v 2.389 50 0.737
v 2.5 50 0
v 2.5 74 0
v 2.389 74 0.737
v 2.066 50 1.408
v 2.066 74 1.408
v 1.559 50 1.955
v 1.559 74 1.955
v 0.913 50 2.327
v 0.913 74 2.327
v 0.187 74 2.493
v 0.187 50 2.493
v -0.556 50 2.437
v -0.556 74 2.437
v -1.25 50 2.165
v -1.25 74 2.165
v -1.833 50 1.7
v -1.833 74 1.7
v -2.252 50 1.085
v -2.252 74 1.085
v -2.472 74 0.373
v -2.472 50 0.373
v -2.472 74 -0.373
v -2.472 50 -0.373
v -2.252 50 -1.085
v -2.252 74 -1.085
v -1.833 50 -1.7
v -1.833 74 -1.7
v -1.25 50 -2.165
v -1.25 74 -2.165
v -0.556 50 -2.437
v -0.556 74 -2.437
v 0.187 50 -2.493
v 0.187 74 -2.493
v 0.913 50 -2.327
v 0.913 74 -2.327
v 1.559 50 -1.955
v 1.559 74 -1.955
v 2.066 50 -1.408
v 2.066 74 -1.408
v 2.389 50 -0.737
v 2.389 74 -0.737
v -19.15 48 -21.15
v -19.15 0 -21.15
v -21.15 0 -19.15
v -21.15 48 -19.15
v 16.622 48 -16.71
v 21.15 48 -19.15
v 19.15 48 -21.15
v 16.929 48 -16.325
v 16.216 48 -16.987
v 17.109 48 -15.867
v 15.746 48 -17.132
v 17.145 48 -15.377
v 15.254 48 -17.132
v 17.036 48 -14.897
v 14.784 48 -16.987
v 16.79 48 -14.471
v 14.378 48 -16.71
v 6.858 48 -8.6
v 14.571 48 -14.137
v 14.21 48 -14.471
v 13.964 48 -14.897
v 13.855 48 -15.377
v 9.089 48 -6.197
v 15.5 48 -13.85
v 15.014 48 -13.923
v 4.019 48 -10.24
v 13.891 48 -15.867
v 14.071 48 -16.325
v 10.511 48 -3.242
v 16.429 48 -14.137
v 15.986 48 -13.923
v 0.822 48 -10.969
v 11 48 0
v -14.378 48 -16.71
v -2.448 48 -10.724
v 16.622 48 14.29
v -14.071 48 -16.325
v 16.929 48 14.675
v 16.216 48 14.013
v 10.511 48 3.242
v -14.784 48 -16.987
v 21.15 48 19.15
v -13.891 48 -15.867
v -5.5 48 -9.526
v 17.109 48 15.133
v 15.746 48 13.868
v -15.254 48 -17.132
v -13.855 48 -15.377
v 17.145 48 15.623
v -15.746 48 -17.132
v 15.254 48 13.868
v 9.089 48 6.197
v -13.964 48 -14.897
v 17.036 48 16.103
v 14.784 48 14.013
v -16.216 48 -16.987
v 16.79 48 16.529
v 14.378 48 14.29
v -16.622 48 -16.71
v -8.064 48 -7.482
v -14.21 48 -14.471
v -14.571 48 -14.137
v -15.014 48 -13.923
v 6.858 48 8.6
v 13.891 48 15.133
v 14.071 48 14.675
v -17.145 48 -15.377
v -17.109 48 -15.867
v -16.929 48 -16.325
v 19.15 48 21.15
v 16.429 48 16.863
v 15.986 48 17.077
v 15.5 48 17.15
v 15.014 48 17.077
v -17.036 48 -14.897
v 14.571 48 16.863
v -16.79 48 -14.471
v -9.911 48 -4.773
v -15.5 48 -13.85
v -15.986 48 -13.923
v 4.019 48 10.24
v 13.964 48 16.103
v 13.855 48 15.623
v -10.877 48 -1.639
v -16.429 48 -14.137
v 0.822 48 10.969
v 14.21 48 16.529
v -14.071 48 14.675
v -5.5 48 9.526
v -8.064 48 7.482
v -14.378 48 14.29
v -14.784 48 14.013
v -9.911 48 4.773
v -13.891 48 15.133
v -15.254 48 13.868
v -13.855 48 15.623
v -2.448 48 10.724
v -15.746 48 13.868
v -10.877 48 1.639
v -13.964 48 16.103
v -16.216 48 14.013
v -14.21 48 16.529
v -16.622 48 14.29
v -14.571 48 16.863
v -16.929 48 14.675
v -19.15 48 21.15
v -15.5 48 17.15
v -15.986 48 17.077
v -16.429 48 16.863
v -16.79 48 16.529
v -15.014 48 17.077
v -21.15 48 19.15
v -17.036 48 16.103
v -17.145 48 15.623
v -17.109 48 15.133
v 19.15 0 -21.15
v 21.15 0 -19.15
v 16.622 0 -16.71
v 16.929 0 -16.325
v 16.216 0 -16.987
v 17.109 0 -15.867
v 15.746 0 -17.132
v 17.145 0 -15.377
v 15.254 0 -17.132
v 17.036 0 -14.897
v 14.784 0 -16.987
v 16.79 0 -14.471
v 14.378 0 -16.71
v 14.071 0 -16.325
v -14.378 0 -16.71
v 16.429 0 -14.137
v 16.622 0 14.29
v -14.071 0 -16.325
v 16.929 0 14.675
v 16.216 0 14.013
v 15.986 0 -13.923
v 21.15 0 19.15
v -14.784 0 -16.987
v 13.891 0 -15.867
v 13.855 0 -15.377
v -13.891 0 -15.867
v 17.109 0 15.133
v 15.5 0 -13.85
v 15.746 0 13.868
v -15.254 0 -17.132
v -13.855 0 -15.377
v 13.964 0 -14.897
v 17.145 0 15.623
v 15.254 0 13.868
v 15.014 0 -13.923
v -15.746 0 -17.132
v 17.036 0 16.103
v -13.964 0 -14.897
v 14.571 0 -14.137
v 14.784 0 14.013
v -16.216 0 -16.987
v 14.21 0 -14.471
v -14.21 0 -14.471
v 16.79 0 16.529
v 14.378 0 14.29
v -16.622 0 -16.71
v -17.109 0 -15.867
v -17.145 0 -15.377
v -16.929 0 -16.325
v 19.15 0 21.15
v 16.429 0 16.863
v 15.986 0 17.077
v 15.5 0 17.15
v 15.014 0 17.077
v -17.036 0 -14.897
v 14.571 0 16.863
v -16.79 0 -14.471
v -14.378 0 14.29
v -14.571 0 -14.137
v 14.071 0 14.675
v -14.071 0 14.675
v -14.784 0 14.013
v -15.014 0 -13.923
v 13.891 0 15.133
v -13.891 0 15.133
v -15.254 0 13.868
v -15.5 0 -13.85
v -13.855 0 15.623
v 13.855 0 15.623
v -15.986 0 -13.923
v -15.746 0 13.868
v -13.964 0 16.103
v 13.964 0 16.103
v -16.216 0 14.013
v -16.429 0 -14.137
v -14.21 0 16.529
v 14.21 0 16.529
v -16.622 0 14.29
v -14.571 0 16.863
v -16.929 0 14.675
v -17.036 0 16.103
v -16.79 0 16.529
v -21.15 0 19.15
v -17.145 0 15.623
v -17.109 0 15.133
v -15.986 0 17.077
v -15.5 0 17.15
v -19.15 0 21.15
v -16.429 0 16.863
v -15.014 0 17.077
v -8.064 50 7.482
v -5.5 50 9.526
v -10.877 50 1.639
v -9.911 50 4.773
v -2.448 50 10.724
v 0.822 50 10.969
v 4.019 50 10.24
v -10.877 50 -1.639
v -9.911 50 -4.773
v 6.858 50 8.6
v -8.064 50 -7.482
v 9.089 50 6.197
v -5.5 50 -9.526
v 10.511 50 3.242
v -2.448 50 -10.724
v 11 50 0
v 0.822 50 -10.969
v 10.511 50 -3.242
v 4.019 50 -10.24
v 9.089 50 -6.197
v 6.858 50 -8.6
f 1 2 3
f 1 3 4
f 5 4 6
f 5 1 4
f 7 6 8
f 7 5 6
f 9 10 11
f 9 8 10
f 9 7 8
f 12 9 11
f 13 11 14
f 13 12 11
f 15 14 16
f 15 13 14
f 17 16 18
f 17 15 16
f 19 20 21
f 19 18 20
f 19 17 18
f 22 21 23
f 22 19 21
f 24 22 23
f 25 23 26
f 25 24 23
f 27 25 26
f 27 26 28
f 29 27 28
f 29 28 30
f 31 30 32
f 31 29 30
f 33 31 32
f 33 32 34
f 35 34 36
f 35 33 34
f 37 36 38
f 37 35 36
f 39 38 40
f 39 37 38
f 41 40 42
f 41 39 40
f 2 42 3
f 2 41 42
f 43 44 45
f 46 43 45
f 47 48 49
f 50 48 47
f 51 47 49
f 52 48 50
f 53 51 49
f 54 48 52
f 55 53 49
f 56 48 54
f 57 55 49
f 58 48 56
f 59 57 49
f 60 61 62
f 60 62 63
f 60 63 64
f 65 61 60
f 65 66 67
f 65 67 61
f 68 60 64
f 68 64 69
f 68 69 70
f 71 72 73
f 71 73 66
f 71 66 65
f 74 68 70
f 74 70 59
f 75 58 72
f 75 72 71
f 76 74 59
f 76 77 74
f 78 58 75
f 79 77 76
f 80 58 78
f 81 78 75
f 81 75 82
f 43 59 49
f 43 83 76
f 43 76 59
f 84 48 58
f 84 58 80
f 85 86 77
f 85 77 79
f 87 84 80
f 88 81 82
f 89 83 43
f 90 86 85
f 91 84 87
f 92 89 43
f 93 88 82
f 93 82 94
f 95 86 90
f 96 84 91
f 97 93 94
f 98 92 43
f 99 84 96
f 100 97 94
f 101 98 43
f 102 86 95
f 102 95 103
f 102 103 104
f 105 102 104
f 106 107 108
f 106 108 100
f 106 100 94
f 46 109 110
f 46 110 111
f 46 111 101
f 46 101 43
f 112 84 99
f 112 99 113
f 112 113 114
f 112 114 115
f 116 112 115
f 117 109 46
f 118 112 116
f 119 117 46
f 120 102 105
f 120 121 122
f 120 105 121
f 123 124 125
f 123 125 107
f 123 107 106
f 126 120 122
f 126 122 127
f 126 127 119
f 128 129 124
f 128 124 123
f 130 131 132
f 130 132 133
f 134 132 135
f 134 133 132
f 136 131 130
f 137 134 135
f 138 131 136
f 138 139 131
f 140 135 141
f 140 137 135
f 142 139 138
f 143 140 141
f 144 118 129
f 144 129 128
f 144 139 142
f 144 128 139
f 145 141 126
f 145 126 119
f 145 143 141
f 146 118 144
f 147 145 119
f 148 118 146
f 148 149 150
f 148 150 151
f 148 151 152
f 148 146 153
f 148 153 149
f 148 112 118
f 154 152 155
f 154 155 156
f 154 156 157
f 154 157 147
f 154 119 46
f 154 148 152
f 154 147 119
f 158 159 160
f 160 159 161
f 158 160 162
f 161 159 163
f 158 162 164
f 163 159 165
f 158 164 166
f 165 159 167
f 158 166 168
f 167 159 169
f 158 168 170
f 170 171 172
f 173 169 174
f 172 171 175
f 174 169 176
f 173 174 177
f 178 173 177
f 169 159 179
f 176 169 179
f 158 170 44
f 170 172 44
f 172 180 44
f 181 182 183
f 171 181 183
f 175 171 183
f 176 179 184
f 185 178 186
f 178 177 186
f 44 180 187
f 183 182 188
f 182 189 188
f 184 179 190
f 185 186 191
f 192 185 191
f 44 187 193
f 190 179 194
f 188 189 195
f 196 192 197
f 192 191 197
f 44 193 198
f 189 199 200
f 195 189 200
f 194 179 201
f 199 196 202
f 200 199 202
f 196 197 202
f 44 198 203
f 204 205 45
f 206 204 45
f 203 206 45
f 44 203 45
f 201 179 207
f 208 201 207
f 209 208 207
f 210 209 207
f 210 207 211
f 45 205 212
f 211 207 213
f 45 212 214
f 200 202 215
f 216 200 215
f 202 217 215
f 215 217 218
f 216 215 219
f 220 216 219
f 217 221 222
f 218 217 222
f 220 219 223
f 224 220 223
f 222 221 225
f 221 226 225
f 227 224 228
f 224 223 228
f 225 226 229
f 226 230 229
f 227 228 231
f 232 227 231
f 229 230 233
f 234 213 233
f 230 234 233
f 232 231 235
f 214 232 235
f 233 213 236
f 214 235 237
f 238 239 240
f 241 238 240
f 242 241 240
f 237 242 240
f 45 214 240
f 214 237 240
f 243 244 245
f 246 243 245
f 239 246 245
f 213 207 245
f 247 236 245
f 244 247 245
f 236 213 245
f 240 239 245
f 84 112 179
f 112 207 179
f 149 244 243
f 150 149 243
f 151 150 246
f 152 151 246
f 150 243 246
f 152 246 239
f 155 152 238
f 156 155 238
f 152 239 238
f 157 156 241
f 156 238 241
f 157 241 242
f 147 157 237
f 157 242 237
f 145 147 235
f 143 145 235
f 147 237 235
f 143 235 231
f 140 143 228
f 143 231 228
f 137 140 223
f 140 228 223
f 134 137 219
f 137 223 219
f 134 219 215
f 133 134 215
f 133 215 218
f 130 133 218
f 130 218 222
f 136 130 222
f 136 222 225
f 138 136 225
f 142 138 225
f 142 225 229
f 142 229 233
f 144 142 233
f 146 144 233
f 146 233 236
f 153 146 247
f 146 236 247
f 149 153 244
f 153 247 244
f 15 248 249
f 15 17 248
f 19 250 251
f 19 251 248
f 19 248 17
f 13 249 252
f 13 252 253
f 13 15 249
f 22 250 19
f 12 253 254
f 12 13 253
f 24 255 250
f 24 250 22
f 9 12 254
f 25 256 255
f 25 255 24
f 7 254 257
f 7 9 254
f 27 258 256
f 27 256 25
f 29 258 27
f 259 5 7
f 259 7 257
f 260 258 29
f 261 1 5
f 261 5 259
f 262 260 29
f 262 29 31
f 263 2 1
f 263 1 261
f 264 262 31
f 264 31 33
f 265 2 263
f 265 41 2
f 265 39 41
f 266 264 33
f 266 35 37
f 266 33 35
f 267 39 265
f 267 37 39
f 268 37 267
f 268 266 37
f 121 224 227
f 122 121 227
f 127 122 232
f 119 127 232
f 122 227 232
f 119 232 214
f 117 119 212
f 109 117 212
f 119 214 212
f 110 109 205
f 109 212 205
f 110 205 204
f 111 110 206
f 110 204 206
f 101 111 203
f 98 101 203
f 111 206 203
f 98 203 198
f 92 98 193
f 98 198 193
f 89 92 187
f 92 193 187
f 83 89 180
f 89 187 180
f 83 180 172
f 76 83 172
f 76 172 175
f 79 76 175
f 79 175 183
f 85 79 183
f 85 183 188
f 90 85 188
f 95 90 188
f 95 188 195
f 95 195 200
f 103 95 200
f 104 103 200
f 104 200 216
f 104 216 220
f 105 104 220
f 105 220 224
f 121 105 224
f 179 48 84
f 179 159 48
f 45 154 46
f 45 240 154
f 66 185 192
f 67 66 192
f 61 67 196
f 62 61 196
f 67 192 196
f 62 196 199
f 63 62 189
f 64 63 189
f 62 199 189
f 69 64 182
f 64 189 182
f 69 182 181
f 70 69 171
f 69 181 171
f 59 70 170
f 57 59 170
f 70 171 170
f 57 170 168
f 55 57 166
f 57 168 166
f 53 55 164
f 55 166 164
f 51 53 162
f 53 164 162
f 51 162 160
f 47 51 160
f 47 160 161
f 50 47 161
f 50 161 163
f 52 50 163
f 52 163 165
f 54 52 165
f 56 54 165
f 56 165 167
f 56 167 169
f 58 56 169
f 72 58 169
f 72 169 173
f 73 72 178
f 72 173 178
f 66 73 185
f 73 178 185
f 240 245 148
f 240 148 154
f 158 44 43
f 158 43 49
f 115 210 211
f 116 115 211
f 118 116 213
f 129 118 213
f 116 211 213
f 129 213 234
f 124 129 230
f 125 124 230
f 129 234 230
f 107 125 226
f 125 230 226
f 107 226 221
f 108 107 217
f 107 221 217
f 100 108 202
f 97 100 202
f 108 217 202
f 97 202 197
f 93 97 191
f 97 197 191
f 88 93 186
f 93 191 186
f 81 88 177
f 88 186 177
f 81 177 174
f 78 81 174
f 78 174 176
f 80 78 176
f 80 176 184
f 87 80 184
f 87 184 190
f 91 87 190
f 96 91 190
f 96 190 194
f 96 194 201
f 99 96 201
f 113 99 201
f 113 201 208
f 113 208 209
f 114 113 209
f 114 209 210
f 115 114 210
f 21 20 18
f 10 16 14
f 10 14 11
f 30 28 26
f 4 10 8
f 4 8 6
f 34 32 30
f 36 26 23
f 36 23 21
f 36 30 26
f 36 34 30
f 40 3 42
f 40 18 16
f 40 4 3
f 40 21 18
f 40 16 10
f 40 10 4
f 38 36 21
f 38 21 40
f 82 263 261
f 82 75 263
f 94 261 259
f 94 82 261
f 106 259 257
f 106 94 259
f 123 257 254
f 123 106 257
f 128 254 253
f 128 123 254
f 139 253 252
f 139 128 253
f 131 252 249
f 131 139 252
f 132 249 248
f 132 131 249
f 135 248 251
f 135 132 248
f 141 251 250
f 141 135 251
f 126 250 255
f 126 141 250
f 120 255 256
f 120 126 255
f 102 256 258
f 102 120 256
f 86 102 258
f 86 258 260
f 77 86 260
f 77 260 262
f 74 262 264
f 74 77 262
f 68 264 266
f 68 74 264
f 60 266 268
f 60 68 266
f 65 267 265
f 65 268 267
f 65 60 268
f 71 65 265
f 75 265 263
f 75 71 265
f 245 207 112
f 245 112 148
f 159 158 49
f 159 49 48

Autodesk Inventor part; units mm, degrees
ref_plane "YZ Plane" through (0, 0, 0) normal (1, 0, 0) x (0, 1, 0)
ref_plane "XZ Plane" through (0, 0, 0) normal (0, 1, 0) x (-1, 0, 0)
ref_plane "XY Plane" through (0, 0, 0) normal (0, 0, 1) x (1, 0, 0)
sketch "Sketch1" plane through (0, 0, 0) normal (0, 1, 0) x (-1, 0, 0)
  line L0 (19.15, -21.15) -> (-19.15, -21.15)
  line L1 (-21.15, -19.15) -> (-21.15, 19.15)
  line L2 (-19.15, 21.15) -> (19.15, 21.15)
  line L3 (21.15, 19.15) -> (21.15, -19.15)
  line L4 (21.15, -21.15) -> (-21.15, 21.15) construction
  line L5 (-21.15, -21.15) -> (21.15, 21.15) construction
  line L6 (-19.15, 21.15) -> (-21.15, 19.15)
  line L7 (-19.15, -21.15) -> (-21.15, -19.15)
  line L8 (19.15, -21.15) -> (21.15, -19.15)
  line L9 (19.15, 21.15) -> (21.15, 19.15)
  point P0 (0, 0)
  dimension "d0" = 42.3
  dimension "d1" = 42.3
  dimension "d2" = 2
  dimension "d3" = 2
  dimension "d4" = 2
  dimension "d5" = 2
  dimension "d6" = 2
  dimension "d7" = 2
  dimension "d8" = 2
  dimension "d9" = 2
extrude "Extrusion1" add sketch "Sketch1" along normal blind 48
sketch "Sketch3" plane through (0, 48, 0) normal (0, 1, 0) x (1, 0, 0)
  line L0 (15.5, -15.5) -> (-15.5, -15.5)
  line L1 (-15.5, -15.5) -> (-15.5, 15.5)
  line L2 (-15.5, 15.5) -> (15.5, 15.5)
  line L3 (15.5, 15.5) -> (15.5, -15.5)
  line L4 (15.5, -15.5) -> (-15.5, 15.5) construction
  line L5 (-15.5, -15.5) -> (15.5, 15.5) construction
  circle A0 centre (-15.5, 15.5) radius 1.65
  circle A1 centre (15.5, 15.5) radius 1.65
  circle A2 centre (-15.5, -15.5) radius 1.65
  circle A3 centre (15.5, -15.5) radius 1.65
  point P0 (0, 0)
  dimension "d15" = 31
  dimension "d16" = 31
  dimension "d17" = 3.3
  dimension "d18" = 3.3
  dimension "d19" = 3.3
  dimension "d20" = 3.3
hole "Hole1" at (15.5, 48, -15.5) at (15.5, 48, 15.5) at (-15.5, 48, 15.5) at (-15.5, 48, -15.5) direction (0, -1, 0) diameter 3.3 end through all
sketch "Sketch2" plane through (0, 48, 0) normal (0, 1, 0) x (1, 0, 0)
  circle A0 centre (0, 0) radius 11
  dimension "d12" = 22
extrude "Extrusion2" add sketch "Sketch2" along normal blind 2
sketch "Sketch4" plane through (0, 50, 0) normal (0, 1, 0) x (1, 0, 0)
  circle A0 centre (0, 0) radius 11 projected
  circle A1 centre (0, 0) radius 2.5
  dimension "d28" = 5
extrude "Extrusion3" add sketch "Sketch4" along normal blind 24 contours A1
equation "\"d3\" = d2"
equation "\"d4\" = d2"
equation "\"d5\" = d4"
equation "\"d6\" = d2"
equation "\"d7\" = d6"
equation "\"d8\" = d2"
equation "\"d9\" = d8"
properties part number "nema17"
